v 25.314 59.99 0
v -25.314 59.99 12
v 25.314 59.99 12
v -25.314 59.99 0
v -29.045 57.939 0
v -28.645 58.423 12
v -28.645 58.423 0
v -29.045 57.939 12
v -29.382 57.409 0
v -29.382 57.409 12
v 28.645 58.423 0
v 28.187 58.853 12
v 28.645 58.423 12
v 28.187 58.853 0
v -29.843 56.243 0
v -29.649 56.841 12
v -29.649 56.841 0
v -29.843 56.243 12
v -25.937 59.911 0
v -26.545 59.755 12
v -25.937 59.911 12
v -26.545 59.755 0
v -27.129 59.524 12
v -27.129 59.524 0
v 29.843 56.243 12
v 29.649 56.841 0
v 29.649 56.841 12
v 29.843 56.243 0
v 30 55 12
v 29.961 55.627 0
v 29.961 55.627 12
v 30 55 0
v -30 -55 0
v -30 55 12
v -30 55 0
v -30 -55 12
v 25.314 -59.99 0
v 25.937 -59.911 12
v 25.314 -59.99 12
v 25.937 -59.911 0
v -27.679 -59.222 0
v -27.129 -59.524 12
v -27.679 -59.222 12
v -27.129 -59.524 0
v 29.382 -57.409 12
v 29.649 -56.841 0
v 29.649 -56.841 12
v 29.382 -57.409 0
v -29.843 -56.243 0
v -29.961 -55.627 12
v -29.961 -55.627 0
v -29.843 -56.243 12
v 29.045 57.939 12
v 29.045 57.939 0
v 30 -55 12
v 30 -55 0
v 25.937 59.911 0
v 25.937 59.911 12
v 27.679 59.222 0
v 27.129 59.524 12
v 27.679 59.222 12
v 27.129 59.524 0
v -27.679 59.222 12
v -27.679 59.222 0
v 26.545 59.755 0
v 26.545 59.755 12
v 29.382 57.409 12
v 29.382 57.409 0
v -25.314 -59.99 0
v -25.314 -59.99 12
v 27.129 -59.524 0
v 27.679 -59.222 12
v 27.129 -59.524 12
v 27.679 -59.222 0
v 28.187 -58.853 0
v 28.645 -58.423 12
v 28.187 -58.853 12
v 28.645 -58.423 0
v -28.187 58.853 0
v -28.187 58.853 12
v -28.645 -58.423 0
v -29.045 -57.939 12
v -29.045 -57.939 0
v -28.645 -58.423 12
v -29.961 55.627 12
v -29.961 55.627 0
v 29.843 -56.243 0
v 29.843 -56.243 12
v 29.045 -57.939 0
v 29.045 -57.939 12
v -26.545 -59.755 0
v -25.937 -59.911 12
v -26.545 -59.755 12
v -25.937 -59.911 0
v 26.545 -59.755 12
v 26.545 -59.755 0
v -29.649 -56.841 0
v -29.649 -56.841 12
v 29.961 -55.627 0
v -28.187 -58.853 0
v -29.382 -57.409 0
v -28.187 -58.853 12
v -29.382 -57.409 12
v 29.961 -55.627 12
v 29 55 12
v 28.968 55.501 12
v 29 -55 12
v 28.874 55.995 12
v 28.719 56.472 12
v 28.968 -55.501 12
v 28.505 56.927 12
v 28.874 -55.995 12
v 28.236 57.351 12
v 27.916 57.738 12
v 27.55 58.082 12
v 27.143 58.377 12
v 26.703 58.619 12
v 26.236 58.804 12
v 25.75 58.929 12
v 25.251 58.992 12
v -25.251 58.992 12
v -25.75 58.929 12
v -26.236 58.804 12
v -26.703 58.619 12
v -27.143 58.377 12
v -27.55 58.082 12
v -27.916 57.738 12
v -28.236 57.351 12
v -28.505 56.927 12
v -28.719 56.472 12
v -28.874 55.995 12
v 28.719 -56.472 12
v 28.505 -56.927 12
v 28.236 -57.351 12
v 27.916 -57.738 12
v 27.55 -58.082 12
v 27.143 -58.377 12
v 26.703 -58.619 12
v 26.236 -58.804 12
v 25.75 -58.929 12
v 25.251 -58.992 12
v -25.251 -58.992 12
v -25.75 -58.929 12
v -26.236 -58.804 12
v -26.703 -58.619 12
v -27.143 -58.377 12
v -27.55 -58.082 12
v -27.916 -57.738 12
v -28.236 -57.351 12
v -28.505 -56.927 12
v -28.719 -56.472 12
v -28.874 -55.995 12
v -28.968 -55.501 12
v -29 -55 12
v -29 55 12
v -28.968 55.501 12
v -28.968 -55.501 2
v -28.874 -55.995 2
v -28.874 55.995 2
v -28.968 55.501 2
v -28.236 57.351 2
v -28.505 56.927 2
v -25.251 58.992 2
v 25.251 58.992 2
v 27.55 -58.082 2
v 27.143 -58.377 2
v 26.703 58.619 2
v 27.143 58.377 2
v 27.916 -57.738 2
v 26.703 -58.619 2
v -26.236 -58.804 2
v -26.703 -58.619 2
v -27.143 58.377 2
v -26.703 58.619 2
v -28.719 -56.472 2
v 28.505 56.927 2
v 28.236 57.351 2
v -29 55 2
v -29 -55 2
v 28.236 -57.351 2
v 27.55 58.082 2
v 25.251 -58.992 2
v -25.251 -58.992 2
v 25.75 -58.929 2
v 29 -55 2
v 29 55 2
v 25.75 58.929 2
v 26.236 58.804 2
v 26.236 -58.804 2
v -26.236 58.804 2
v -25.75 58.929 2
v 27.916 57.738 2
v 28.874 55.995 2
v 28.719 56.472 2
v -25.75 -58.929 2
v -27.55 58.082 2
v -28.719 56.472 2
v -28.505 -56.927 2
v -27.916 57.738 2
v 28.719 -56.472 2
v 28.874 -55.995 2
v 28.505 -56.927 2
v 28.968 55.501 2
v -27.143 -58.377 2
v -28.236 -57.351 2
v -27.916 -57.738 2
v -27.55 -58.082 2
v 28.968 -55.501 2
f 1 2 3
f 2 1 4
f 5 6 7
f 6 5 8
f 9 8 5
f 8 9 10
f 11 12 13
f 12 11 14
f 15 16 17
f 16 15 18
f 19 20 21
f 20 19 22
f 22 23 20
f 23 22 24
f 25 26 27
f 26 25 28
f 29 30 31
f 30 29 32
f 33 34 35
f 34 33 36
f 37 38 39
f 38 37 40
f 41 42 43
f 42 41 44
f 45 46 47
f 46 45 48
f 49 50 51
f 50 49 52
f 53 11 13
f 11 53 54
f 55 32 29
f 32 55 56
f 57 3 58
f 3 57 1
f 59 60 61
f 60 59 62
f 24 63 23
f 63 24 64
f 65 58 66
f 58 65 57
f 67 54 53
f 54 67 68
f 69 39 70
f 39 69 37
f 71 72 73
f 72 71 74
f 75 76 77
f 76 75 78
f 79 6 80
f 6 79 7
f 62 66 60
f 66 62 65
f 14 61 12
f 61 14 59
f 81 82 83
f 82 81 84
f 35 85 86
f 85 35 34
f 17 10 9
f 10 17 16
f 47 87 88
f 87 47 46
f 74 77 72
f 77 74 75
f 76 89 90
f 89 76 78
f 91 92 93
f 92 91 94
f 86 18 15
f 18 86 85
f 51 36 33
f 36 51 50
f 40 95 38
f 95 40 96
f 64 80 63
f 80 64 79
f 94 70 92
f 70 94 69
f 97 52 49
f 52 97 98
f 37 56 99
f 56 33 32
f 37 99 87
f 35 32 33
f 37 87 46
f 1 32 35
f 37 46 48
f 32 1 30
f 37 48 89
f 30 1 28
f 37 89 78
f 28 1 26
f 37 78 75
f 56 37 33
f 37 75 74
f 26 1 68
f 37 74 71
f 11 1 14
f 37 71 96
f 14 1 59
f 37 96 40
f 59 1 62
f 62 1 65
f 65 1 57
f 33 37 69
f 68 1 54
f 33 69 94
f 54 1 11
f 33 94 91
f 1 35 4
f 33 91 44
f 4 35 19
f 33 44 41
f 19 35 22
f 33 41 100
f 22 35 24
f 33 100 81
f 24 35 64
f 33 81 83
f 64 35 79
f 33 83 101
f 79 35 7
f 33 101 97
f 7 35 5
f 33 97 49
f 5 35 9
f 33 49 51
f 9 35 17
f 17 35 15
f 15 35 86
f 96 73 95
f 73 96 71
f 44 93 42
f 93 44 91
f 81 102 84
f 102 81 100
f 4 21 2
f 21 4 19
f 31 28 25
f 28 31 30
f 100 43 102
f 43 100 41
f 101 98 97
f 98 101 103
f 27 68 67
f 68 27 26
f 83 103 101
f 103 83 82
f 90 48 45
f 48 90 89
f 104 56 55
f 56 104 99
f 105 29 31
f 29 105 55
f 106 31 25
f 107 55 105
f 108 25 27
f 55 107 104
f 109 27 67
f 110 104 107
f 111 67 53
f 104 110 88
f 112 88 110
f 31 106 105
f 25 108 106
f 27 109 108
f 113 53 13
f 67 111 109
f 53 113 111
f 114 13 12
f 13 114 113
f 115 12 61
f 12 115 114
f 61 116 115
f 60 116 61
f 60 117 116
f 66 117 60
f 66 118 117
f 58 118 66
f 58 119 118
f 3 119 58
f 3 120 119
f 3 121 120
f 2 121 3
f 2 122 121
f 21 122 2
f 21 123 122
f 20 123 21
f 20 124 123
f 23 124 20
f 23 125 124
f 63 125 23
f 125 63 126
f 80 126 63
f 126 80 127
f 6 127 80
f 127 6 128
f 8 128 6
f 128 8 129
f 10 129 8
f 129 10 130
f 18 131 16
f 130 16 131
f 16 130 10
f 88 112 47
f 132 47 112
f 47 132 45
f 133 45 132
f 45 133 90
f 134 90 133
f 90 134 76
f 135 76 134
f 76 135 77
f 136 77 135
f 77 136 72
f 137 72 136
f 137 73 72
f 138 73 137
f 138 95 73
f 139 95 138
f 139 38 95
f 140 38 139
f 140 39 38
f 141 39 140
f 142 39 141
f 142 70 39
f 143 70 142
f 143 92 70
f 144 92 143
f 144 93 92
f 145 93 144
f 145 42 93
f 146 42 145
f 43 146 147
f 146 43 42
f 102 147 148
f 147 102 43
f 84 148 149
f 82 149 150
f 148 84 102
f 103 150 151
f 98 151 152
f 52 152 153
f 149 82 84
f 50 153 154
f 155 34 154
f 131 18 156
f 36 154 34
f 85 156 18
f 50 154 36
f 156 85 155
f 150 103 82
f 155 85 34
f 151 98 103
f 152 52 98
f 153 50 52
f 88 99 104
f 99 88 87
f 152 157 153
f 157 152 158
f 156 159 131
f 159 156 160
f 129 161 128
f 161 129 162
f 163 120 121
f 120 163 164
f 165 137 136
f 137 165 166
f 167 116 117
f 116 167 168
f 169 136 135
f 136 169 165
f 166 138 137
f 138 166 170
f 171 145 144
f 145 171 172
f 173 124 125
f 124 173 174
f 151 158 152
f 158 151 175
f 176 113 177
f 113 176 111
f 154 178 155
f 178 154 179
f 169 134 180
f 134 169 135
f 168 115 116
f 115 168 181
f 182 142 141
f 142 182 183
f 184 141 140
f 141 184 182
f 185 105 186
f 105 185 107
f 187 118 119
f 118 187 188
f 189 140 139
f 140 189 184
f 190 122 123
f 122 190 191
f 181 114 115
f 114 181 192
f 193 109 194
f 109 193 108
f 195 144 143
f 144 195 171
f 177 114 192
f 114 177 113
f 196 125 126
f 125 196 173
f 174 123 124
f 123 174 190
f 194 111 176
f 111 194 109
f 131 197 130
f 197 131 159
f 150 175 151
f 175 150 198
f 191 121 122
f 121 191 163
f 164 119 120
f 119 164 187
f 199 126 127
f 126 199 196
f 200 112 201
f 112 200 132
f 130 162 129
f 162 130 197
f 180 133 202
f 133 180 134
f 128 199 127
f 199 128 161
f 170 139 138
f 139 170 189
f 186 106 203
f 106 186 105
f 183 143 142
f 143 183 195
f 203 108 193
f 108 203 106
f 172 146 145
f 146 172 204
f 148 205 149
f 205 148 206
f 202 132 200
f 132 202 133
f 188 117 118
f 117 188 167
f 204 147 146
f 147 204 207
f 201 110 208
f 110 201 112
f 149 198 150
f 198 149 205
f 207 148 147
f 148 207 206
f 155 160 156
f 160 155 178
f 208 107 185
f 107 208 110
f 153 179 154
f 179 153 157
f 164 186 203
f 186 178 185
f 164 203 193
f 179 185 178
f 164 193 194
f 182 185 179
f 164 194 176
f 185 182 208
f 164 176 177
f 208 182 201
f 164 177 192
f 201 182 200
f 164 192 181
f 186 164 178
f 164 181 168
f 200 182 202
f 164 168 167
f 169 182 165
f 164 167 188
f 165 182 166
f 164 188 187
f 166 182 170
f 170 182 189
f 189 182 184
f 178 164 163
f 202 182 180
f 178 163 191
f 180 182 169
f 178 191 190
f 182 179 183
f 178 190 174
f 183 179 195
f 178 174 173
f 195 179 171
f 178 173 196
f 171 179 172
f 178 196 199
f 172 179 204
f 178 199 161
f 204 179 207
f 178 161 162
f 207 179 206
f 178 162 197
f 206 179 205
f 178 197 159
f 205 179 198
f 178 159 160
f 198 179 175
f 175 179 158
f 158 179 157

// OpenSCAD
$fn = 50;


difference() {
	union() {
		hull() {
			translate(v = [-25.0000000000, 55.0000000000, 0]) {
				cylinder(h = 12, r = 5);
			}
			translate(v = [25.0000000000, 55.0000000000, 0]) {
				cylinder(h = 12, r = 5);
			}
			translate(v = [-25.0000000000, -55.0000000000, 0]) {
				cylinder(h = 12, r = 5);
			}
			translate(v = [25.0000000000, -55.0000000000, 0]) {
				cylinder(h = 12, r = 5);
			}
		}
	}
	union() {
		translate(v = [0, 0, 2]) {
			hull() {
				translate(v = [-25.0000000000, 55.0000000000, 0]) {
					cylinder(h = 10, r = 4);
				}
				translate(v = [25.0000000000, 55.0000000000, 0]) {
					cylinder(h = 10, r = 4);
				}
				translate(v = [-25.0000000000, -55.0000000000, 0]) {
					cylinder(h = 10, r = 4);
				}
				translate(v = [25.0000000000, -55.0000000000, 0]) {
					cylinder(h = 10, r = 4);
				}
			}
		}
	}
}
